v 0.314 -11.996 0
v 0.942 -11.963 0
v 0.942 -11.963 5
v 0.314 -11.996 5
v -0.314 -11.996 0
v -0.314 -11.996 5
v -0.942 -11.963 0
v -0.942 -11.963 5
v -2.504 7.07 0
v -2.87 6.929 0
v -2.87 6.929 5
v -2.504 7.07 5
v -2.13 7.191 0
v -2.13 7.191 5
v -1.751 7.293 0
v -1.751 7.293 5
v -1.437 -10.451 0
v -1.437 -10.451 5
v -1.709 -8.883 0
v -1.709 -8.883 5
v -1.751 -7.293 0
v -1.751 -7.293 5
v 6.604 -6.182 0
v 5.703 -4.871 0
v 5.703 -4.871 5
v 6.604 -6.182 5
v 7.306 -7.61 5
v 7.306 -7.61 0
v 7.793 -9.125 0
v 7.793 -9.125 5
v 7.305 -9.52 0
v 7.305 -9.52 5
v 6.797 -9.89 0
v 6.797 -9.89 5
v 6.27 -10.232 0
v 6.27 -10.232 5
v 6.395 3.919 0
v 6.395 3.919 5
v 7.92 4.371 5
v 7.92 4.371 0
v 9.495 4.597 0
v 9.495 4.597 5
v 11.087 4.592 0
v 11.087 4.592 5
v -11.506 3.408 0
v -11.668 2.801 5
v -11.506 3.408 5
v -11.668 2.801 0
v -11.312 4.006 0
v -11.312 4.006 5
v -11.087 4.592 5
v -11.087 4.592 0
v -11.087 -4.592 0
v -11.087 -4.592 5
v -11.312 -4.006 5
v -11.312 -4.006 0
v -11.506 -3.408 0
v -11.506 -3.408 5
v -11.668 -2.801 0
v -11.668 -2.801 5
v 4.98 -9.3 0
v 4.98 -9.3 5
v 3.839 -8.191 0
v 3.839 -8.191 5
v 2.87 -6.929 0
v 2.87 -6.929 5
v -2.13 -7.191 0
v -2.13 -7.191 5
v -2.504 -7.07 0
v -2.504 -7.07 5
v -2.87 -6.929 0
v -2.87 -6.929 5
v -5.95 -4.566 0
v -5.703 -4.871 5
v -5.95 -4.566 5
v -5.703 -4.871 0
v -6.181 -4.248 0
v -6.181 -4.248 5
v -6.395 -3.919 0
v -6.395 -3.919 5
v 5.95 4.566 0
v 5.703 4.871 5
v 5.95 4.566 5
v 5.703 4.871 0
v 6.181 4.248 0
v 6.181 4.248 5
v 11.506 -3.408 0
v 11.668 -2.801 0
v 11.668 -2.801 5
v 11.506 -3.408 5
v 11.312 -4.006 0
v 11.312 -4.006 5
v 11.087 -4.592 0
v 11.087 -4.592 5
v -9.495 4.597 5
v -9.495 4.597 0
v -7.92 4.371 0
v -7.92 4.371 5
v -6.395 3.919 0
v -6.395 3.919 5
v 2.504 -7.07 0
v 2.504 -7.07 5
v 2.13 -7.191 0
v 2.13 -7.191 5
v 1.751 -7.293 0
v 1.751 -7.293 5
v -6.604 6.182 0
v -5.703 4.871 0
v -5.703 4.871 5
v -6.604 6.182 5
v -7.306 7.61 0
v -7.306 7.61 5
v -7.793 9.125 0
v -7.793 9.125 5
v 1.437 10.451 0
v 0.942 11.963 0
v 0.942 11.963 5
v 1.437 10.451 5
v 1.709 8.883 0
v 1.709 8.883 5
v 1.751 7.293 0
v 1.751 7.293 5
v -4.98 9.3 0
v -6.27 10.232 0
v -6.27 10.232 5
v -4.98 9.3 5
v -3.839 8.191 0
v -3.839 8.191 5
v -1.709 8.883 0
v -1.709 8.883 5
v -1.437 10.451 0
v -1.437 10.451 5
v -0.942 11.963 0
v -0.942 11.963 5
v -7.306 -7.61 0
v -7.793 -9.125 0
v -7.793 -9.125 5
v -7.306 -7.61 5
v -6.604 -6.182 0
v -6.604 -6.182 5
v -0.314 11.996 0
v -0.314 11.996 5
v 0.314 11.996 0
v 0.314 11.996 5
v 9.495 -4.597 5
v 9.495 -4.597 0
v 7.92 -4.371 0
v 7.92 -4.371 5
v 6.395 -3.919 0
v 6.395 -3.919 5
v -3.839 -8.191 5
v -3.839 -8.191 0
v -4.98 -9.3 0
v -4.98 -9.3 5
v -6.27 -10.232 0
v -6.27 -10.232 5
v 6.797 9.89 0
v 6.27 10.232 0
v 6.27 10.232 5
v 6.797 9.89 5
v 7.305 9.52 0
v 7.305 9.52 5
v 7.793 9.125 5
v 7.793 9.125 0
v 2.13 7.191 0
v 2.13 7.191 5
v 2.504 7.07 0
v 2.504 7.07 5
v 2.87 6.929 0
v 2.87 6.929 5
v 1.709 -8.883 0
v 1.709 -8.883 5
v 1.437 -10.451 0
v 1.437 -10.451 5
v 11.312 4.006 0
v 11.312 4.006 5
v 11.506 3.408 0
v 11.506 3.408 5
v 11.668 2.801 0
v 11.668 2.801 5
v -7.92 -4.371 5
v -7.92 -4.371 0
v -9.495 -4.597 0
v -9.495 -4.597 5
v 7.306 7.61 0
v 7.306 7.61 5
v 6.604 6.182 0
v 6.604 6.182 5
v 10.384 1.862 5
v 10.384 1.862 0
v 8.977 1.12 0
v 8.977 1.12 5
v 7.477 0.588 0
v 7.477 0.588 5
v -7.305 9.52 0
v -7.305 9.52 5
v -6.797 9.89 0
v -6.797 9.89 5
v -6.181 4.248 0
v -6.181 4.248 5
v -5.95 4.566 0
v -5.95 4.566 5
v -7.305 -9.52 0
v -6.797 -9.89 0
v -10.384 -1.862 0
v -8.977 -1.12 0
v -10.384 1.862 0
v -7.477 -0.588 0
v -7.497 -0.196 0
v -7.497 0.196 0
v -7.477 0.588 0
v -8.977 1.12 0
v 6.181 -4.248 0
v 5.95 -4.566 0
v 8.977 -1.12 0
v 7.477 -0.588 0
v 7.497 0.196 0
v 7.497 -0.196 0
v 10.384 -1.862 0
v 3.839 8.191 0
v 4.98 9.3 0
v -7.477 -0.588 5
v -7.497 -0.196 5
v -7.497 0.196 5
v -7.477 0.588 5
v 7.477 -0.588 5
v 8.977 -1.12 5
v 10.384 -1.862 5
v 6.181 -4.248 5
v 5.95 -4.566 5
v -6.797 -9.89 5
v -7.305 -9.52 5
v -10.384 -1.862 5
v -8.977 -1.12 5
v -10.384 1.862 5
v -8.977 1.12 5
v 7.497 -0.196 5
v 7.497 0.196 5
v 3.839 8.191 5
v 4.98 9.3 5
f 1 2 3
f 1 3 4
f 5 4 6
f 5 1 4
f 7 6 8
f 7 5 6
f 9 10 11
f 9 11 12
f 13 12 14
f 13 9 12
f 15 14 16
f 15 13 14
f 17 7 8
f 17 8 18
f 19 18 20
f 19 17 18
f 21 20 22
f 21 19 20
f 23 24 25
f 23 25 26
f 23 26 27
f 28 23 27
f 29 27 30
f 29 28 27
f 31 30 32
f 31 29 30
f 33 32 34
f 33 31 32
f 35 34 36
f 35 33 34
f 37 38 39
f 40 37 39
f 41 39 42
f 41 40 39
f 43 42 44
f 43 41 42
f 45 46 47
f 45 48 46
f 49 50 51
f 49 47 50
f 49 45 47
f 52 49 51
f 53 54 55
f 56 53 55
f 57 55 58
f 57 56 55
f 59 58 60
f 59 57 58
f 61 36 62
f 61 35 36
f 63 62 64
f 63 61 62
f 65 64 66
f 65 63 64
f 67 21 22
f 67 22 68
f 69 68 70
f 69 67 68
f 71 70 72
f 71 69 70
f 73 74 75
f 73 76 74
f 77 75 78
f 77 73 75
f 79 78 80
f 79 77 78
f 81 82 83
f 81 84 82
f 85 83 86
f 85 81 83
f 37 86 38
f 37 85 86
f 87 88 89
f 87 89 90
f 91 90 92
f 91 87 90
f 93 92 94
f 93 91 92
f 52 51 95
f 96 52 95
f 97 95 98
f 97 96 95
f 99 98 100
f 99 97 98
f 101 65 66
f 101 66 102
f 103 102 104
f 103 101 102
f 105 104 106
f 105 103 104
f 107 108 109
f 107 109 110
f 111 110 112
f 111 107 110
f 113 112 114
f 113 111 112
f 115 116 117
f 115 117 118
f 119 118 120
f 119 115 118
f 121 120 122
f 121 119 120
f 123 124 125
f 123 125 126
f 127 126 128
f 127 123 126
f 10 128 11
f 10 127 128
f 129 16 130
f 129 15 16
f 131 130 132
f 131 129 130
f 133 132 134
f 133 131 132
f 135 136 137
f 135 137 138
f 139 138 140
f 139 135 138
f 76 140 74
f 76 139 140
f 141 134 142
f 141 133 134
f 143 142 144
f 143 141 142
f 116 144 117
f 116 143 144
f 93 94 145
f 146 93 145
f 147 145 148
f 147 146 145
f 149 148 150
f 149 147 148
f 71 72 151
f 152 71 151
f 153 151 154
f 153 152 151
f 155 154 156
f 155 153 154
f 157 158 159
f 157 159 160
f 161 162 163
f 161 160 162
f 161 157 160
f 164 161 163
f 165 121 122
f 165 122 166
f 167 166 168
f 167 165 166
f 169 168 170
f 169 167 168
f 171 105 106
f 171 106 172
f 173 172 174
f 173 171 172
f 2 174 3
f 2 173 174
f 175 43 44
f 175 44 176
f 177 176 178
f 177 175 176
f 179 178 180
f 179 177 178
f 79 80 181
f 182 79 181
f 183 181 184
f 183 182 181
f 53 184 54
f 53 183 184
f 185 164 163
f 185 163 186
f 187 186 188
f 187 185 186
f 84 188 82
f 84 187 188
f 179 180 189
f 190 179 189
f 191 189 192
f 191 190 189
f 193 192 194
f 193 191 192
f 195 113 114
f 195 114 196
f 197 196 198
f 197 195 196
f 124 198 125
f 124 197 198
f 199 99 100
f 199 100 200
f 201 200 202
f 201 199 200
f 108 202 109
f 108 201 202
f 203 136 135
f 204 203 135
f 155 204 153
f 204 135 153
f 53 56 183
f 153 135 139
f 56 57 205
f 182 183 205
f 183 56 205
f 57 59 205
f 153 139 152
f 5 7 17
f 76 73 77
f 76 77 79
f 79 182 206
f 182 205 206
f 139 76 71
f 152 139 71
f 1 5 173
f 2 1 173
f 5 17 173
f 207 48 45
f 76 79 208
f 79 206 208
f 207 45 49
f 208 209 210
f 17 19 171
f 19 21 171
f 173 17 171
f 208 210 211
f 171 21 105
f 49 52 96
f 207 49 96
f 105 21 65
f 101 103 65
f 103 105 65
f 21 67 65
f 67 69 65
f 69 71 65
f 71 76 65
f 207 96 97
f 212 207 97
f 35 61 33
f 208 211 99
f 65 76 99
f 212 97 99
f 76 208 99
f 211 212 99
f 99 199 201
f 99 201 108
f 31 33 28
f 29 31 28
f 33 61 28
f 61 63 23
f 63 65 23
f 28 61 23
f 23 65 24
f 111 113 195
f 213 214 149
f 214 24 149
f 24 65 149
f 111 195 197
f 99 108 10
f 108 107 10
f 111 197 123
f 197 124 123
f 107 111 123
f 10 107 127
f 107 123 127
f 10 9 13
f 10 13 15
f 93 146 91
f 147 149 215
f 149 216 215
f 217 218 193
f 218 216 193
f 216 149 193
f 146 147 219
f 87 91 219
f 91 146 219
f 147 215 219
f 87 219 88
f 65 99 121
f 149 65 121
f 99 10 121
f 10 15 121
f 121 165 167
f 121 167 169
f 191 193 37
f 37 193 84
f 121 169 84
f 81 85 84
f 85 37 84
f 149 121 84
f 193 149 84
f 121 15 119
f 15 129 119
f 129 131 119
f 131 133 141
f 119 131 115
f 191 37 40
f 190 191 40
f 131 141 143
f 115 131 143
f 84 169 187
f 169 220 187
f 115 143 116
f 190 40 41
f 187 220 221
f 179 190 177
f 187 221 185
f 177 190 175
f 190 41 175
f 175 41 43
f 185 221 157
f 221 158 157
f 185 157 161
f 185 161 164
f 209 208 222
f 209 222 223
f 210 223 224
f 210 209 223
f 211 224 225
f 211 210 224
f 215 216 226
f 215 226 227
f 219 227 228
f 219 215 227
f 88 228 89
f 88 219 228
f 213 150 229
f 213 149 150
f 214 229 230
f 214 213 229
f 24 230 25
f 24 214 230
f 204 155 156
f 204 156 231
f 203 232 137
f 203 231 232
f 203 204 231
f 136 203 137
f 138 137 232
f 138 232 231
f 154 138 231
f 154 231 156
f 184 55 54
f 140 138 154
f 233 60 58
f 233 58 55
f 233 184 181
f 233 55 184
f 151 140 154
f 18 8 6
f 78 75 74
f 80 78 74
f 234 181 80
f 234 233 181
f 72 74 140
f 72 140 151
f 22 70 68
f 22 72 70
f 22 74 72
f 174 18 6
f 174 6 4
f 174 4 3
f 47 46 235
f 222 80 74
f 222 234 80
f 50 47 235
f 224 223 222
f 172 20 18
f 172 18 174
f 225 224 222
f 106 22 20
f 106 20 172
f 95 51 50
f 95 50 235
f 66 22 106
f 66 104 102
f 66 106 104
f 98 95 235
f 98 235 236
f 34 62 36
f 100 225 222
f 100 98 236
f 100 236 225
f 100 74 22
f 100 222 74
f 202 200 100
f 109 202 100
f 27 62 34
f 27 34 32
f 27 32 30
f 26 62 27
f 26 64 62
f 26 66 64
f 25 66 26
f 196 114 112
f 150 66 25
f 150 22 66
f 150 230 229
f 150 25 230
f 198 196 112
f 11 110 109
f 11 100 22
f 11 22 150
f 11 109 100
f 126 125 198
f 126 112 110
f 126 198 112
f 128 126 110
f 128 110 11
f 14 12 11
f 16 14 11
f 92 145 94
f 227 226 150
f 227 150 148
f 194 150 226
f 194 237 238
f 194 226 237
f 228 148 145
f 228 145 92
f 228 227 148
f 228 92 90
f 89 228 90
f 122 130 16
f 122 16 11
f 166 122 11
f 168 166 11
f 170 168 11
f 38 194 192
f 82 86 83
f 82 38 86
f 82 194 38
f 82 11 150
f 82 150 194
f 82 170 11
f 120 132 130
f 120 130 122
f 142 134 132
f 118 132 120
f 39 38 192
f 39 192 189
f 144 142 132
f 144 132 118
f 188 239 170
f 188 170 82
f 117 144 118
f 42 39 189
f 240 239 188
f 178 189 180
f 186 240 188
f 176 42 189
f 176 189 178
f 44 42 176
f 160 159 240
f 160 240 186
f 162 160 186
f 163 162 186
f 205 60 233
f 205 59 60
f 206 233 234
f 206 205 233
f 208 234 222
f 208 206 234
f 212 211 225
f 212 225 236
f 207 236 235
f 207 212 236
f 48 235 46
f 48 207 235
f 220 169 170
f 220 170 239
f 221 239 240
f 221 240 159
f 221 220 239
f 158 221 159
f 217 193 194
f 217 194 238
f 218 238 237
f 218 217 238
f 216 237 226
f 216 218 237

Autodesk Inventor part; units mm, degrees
sketch "Sketch1" plane through (0, 0, 0) normal (0, 0, 1) x (1, 0, 0)
  circle A0 centre (0, 0) radius 12
  dimension "d0" = 24
extrude "Extrusion1" add sketch "Sketch1" along normal blind 5
ref_plane "Work Plane2" through (0, 0, 2.5) normal (0, 0, 1) x (1, 0, 0)
sketch "Sketch2" plane through (0, 0, 0) normal (0, 0, -1) x (-1, 0, 0)
  circle A0 centre (0, 0) radius 12 projected
  circle A1 centre (0, 0) radius 10
  dimension "d3" = 20
surface extrude "Pitch Diameter" sketch "Sketch2" against normal through all shown no curves A1
ref_plane "Work Plane8" through (0, 0, 0) normal (0.9510565, 0.309017, 0) x (0, 0, 1)
ref_plane "Work Plane9" through (0, 0, 0) normal (1, 0, 0) x (0, 1, 0)
spur gear teeth "Spur Gear" teeth 10 pitch diameter 20 tip diameter 24 root diameter 15 face width 5 start plane through (0, 0, 0) normal (0, 0, -1) x (-1, 0, 0)
equation "\"d0\" = da_da"
equation "\"d1\" = da_b"
equation "\"d3\" = da_d"
equation "\"da_da\" = 24"
equation "\"da_b\" = 5"
equation "\"da_d\" = 20"
properties part number "Spur Gear1" material "Steel"
